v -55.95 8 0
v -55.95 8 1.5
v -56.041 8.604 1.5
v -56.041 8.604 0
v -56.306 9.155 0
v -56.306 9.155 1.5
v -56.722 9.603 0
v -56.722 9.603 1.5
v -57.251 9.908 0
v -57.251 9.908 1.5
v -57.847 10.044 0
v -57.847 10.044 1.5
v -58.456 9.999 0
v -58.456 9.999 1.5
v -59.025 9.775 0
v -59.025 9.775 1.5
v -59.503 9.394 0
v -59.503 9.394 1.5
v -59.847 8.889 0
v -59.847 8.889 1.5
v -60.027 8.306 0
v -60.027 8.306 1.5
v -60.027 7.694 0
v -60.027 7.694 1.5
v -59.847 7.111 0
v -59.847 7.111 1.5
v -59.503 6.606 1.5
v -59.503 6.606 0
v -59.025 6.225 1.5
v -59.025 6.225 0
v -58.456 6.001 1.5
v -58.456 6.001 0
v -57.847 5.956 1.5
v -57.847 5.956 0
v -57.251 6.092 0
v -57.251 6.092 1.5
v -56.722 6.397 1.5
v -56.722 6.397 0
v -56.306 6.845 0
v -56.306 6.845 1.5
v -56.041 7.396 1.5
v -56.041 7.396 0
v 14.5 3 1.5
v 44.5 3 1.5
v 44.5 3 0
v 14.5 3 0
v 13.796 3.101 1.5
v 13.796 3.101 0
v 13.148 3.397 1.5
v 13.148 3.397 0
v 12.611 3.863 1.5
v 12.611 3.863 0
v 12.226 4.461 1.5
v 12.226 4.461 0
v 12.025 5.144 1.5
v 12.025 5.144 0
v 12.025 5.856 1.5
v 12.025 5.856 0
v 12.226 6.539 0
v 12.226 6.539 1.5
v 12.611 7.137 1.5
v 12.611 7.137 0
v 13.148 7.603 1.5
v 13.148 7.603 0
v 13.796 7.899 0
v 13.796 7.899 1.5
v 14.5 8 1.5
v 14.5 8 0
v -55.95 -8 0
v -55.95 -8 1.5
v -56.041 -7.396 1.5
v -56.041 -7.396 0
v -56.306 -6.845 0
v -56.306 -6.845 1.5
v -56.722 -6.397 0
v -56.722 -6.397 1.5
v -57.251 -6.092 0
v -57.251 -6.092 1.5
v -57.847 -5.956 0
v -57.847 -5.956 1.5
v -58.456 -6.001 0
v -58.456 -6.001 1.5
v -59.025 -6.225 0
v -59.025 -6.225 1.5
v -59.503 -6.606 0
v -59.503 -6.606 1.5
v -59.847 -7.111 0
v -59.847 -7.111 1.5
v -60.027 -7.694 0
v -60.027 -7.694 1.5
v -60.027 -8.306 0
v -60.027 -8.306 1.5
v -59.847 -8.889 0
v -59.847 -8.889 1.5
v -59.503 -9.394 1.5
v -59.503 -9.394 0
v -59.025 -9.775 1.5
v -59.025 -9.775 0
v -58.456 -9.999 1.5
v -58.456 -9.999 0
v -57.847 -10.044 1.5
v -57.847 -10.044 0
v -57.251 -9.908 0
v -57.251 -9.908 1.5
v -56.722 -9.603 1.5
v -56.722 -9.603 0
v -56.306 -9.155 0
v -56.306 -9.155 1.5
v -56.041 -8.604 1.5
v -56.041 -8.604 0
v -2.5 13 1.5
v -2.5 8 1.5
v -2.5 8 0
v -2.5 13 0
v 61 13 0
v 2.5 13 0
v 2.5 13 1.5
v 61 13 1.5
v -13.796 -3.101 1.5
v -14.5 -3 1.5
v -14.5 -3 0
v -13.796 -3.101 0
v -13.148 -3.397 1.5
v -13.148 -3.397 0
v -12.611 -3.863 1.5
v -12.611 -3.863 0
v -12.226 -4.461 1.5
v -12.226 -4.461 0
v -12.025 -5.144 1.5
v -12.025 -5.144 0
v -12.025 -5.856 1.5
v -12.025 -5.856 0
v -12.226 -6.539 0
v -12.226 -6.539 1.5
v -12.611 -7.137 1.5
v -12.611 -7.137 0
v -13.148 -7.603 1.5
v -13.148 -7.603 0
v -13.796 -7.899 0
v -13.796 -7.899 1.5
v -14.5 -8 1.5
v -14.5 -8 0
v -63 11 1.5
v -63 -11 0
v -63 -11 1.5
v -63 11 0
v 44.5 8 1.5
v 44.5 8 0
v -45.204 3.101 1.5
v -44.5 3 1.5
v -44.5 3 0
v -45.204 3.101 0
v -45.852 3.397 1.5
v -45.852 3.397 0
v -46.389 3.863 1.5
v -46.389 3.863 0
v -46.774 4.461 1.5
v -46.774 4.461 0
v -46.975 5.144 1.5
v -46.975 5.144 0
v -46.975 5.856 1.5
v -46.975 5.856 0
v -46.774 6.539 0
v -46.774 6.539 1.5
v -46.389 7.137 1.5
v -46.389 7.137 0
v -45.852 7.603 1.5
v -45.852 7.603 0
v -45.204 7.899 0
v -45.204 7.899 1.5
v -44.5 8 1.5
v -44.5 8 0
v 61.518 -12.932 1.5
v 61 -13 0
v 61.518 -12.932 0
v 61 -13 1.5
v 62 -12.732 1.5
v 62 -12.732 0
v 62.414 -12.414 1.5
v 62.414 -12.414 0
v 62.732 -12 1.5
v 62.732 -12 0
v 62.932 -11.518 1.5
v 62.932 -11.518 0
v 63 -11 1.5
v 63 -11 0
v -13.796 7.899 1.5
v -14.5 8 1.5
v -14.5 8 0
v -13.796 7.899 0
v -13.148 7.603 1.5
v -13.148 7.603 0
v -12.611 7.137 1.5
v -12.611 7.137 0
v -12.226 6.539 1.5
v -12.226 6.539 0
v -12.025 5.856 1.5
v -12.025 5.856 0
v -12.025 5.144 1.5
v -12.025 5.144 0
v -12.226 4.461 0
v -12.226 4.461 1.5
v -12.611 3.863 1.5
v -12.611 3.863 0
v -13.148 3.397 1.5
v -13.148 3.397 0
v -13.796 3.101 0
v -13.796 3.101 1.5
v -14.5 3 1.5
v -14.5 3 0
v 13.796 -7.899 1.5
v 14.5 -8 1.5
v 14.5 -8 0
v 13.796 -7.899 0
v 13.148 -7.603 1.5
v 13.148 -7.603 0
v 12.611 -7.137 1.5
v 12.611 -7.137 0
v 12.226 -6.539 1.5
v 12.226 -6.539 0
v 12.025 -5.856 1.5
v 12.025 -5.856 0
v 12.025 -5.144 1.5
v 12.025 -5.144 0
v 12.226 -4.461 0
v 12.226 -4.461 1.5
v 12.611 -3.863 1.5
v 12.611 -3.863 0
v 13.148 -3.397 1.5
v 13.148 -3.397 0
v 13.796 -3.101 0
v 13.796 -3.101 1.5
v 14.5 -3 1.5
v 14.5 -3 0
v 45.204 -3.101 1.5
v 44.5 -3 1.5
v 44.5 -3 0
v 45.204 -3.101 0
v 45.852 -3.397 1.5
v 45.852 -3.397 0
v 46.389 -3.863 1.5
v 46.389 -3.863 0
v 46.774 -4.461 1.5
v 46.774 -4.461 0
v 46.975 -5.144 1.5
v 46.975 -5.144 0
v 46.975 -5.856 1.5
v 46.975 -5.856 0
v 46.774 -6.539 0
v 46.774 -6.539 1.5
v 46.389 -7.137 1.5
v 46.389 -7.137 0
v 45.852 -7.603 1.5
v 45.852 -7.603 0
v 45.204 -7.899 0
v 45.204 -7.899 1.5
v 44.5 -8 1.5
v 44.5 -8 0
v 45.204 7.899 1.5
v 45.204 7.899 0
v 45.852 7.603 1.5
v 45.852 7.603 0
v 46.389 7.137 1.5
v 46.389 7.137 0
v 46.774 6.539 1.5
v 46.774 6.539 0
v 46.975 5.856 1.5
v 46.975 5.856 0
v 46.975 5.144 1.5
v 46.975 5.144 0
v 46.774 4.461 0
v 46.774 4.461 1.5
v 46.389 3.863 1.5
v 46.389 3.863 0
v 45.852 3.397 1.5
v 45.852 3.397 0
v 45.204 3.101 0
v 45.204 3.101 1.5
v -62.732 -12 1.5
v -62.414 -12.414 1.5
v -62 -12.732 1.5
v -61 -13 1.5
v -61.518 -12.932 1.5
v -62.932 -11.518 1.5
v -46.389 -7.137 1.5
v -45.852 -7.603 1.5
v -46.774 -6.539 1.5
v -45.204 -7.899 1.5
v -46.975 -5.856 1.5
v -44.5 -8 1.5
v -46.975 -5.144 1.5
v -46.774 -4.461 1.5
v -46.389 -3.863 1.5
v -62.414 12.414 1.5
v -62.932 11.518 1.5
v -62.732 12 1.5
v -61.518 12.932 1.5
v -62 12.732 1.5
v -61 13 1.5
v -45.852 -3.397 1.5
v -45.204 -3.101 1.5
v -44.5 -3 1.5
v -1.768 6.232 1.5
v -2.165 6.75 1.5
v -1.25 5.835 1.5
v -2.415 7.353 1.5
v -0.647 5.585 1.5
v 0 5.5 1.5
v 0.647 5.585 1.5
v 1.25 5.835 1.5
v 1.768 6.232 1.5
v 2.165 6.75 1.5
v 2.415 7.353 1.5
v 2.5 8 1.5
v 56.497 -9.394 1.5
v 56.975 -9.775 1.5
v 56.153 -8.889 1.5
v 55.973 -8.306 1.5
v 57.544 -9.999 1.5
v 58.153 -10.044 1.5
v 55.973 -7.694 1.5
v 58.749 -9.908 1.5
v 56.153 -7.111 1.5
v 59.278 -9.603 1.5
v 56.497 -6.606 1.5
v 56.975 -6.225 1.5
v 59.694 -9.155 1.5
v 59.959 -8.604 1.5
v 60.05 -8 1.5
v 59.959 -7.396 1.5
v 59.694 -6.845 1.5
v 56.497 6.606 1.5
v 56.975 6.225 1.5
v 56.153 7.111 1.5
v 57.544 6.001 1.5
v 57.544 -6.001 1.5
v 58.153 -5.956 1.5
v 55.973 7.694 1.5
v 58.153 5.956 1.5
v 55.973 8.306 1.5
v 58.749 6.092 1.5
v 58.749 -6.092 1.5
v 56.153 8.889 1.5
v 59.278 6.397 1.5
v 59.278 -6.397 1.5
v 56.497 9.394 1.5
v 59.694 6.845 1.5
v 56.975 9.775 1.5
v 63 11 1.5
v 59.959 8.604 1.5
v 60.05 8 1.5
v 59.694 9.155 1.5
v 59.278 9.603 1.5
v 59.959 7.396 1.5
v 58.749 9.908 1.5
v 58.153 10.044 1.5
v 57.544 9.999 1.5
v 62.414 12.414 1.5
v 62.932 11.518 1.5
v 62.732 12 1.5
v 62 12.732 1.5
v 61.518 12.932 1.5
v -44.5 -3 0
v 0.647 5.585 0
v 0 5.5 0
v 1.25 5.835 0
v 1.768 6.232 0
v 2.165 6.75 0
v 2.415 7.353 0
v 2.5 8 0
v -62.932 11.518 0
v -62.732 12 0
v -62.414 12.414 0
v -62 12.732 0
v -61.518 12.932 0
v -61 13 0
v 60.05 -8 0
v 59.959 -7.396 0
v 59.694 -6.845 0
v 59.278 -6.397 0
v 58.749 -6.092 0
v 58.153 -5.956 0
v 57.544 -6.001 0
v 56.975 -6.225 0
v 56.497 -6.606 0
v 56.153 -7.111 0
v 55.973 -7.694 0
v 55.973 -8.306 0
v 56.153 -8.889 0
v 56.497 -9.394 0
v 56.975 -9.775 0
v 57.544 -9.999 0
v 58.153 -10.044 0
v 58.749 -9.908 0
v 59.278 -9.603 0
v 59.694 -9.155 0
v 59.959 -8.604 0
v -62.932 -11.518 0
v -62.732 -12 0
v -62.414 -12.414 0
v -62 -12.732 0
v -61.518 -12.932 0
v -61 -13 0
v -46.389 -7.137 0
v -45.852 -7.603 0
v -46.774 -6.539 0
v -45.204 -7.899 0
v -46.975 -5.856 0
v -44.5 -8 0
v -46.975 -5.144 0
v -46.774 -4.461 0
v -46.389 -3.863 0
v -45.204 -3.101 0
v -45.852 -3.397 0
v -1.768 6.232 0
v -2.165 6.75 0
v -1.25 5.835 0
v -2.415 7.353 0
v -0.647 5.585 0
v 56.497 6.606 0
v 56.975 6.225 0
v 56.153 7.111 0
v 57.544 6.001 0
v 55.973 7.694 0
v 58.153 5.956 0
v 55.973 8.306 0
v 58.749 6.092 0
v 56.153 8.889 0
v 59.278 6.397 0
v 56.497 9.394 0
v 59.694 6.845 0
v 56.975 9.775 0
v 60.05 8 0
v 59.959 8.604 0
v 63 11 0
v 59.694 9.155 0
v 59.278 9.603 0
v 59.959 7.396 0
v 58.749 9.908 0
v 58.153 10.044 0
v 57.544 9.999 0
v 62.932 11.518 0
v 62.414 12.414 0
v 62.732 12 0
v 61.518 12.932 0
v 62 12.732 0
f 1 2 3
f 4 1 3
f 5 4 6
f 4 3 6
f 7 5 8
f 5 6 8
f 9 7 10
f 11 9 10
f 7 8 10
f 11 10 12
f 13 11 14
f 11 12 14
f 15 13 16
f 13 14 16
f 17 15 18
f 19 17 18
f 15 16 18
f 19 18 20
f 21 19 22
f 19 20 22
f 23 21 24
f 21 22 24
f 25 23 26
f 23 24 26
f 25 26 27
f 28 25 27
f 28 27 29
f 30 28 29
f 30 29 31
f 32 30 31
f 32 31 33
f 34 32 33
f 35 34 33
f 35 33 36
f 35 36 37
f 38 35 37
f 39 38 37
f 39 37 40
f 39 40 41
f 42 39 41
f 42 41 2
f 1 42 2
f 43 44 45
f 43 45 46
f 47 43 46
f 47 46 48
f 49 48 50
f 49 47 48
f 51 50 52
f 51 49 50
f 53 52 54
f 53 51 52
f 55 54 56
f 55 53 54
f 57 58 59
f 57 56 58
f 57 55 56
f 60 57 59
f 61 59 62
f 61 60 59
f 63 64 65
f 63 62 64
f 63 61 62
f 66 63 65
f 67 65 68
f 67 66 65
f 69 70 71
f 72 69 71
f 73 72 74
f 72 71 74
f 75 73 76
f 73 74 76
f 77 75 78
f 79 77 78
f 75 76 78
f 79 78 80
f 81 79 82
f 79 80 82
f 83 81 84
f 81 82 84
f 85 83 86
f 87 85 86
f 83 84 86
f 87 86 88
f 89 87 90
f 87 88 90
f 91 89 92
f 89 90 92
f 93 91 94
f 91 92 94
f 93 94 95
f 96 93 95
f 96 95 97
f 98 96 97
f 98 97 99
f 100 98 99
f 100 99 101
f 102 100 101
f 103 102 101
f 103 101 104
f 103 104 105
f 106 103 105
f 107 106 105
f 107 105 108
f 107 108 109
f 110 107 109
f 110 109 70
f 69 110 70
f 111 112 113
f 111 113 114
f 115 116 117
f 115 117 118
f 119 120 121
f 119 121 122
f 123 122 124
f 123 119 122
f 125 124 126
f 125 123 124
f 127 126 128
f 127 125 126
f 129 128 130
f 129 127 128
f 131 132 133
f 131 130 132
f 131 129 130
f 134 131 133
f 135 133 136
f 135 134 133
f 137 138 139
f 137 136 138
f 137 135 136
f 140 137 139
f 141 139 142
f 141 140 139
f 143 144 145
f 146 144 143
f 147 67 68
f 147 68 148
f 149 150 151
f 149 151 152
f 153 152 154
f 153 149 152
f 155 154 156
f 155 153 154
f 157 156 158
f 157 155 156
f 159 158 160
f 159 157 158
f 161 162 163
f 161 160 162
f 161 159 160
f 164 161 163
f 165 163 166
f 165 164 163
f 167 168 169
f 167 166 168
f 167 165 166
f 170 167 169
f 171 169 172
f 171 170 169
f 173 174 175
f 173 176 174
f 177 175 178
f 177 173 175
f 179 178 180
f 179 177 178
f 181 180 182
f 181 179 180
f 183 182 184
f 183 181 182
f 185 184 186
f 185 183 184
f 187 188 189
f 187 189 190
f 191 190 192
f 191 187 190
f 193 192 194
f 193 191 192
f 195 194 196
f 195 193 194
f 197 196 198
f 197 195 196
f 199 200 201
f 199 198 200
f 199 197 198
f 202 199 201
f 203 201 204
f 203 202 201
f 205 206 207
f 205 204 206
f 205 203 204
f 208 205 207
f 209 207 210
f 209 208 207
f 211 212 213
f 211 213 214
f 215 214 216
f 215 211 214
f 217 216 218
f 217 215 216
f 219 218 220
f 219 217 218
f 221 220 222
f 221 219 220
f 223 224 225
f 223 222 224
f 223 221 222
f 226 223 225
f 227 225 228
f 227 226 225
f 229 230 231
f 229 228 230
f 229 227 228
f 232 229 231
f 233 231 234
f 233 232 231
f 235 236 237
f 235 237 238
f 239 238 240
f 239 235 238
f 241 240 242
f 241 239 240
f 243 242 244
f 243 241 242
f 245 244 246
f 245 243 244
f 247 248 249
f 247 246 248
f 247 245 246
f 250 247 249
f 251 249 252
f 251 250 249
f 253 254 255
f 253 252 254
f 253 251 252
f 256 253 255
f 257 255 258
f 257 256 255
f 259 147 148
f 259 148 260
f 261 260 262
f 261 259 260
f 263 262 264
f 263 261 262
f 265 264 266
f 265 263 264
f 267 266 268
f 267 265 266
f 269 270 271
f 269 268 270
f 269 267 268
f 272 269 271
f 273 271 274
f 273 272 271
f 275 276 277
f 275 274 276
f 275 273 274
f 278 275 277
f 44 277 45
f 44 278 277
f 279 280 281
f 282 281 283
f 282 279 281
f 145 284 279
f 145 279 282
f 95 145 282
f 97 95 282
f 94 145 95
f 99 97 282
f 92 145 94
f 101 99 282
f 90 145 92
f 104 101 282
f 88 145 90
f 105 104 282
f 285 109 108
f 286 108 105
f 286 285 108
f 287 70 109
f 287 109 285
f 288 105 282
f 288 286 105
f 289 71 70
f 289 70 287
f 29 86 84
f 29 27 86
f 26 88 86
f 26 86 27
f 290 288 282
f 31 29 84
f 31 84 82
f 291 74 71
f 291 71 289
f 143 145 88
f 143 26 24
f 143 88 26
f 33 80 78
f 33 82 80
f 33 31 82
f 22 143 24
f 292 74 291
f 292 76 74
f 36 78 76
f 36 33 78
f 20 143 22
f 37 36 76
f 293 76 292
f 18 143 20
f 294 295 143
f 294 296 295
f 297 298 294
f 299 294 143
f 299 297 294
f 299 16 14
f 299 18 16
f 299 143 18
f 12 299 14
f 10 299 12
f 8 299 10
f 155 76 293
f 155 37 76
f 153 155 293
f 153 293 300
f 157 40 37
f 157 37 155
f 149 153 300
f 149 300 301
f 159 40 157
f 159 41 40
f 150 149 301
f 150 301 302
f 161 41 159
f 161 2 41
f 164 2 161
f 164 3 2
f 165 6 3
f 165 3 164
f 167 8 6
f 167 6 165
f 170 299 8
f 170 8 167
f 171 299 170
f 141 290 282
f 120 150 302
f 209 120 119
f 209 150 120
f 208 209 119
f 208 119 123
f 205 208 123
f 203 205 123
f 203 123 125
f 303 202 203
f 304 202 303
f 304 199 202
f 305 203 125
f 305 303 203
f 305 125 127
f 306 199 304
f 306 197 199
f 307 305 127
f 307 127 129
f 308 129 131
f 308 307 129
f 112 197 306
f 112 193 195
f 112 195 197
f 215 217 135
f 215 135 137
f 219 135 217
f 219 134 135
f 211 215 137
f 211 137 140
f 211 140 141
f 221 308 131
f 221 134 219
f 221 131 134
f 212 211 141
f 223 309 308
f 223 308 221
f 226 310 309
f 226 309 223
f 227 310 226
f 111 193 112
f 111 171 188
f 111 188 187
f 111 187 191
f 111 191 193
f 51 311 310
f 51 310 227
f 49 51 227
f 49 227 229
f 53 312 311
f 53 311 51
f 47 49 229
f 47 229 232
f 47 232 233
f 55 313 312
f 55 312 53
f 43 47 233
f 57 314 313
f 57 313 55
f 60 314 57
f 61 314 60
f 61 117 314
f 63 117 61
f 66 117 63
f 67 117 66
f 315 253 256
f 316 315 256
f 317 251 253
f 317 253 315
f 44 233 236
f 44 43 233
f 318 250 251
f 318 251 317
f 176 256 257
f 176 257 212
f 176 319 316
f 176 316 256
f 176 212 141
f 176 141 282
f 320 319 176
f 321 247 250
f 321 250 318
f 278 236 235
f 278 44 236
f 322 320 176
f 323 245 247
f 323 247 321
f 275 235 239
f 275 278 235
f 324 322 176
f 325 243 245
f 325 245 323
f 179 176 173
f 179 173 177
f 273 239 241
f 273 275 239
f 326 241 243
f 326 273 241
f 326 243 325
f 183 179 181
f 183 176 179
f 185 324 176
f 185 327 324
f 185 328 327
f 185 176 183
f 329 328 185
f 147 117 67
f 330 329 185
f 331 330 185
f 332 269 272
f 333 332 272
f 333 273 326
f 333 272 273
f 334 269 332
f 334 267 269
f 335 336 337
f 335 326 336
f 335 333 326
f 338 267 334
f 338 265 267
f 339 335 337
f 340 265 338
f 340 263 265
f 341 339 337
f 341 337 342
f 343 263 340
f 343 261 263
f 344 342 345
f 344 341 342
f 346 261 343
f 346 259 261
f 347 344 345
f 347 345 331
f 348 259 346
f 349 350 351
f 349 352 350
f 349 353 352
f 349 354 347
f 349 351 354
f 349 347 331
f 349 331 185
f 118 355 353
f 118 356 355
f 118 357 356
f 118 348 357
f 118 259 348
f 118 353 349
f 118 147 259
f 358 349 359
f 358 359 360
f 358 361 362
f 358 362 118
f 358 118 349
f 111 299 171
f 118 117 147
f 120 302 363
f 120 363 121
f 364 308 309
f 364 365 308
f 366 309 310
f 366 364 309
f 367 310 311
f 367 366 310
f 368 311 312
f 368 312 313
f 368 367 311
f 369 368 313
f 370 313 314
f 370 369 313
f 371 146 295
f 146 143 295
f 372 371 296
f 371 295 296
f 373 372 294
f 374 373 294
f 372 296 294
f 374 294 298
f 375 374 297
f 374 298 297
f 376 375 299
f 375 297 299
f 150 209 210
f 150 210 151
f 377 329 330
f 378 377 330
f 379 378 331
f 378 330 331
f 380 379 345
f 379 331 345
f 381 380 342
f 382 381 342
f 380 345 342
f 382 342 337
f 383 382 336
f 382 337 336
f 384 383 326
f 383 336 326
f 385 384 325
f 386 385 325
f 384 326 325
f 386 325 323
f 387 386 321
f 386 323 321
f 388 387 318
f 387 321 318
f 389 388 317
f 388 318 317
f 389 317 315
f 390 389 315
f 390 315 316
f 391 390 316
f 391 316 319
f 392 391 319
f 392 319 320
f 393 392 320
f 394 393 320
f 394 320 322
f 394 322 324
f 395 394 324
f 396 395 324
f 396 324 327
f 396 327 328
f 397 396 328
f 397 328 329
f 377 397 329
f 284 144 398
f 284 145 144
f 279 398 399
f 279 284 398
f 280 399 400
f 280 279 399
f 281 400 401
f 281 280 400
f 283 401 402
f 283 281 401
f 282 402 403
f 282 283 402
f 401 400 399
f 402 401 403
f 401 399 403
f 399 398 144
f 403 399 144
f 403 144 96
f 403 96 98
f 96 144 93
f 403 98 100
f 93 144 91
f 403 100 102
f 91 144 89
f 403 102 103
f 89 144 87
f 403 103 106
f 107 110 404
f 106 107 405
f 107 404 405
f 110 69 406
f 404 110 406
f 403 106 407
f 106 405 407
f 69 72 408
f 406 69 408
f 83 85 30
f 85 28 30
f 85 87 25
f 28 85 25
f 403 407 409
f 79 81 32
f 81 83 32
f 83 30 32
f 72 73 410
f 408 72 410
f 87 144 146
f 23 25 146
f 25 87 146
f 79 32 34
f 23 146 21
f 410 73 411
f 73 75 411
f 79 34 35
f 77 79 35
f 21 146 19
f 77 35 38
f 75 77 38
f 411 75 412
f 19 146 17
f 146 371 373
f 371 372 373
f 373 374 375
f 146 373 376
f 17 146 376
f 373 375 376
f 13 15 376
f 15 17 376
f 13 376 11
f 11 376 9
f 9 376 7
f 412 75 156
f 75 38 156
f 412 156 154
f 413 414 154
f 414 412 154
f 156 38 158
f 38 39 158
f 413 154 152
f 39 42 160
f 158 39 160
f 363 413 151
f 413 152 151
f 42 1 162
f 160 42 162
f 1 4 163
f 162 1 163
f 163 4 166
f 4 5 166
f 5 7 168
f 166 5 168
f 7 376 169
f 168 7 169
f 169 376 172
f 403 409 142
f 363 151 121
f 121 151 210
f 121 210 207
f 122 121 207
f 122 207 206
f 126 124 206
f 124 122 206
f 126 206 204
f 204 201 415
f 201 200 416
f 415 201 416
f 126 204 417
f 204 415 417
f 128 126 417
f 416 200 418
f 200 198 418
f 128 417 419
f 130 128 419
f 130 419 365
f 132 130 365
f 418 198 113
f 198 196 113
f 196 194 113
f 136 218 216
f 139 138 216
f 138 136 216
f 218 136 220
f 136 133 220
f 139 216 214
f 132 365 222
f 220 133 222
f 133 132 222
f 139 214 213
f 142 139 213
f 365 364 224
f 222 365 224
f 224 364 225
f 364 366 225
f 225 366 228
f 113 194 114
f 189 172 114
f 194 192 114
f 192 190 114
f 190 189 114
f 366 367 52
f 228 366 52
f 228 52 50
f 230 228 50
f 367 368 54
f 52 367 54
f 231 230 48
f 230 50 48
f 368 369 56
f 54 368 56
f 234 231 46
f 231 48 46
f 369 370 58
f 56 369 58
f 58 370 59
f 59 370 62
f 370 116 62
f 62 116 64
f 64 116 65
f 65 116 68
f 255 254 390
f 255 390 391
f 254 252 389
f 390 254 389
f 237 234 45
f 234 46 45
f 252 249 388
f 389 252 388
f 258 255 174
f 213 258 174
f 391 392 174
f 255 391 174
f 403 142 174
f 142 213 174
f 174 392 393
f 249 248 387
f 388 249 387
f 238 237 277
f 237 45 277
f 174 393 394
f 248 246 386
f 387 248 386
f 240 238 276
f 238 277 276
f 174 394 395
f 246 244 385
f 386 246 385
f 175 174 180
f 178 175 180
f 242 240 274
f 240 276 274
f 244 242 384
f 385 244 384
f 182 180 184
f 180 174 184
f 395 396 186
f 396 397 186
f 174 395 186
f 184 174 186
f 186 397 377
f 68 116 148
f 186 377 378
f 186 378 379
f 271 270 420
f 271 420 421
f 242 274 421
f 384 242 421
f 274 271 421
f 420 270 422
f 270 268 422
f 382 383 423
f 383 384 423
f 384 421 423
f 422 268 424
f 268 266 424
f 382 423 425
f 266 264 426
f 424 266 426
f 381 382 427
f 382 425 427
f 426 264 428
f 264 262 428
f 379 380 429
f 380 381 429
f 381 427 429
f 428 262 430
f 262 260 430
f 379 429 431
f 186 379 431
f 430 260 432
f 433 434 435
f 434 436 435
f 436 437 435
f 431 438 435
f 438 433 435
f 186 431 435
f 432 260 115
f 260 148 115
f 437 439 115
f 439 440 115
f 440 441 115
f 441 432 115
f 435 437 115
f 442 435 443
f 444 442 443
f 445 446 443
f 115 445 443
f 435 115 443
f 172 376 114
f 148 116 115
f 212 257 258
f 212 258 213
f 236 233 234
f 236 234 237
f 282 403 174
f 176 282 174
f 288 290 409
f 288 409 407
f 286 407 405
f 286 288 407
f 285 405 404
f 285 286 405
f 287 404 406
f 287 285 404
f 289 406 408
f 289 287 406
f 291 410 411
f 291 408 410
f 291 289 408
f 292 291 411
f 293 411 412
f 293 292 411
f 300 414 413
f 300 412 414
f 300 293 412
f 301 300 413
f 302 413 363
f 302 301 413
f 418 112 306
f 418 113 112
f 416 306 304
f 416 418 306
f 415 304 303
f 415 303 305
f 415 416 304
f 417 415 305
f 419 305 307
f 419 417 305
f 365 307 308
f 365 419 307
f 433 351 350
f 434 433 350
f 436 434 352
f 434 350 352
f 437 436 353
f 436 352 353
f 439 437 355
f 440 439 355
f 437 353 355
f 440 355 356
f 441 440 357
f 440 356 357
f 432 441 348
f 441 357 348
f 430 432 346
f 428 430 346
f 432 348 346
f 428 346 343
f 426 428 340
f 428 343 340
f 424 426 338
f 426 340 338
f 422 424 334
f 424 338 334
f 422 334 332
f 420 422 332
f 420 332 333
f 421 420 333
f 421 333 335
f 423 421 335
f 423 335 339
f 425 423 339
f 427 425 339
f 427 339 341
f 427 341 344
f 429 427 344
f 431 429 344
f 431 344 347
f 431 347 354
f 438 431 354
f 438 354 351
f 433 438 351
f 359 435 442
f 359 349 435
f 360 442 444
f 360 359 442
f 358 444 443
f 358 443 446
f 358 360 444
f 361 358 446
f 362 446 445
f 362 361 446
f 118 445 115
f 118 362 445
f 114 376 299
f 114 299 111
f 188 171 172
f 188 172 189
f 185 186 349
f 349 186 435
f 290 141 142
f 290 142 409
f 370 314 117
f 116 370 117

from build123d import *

# Parameters (mm, degrees)
SKETCH_1_W          = 126
SKETCH_1_H          = 26
EXTRUDE_1_DEPTH     = 1.5
FILLET_1_R          = 2
SKETCH_2_W          = 5
SKETCH_2_H          = 15
CUT_EXTRUDE_1_DEPTH = 65.344774458
FILLET_2_R          = 2.5
CUT_EXTRUDE_2_DEPTH = 65.344774458
SKETCH_4_R          = 2.05
CUT_EXTRUDE_3_DEPTH = 65.344774458


with BuildPart() as part:
    # 草图1 → 凸台-拉伸1 (new body)
    with BuildSketch(Plane.XY):
        Rectangle(SKETCH_1_W, SKETCH_1_H)
    extrude(amount=EXTRUDE_1_DEPTH)

    # 圆角1
    fillet_1_edges = [part.edges().sort_by_distance(p)[0] for p in [
        (-63, 13, 0.75),
        (63, 13, 0.75),
        (63, -13, 0.75),
        (-63, -13, 0.75),
    ]]
    fillet(fillet_1_edges, radius=FILLET_1_R)

    # 草图2 → 切除-拉伸1 (cut, through all)
    with BuildSketch(Plane.XY.offset(1.5)):
        with Locations((0, 13)):
            Rectangle(SKETCH_2_W, SKETCH_2_H)
    extrude(amount=-CUT_EXTRUDE_1_DEPTH, mode=Mode.SUBTRACT)

    # 圆角2
    fillet_2_edges = [part.edges().sort_by_distance(p)[0] for p in [
        (2.5, 5.5, 0.75),
        (-2.5, 5.5, 0.75),
    ]]
    fillet(fillet_2_edges, radius=FILLET_2_R - 0.0001)  # a hair under: the kernel refuses the full size

    # 草图3 → 切除-拉伸2 (cut, through all)
    with BuildSketch(Plane.XY.offset(1.5)):
        with BuildLine():
            Line((-44.5, 8), (-14.5, 8))
            ThreePointArc((-14.5, 8), (-12, 5.5), (-14.5, 3))
            Line((-14.5, 3), (-44.5, 3))
            ThreePointArc((-44.5, 3), (-47, 5.5), (-44.5, 8))
        make_face()
        with BuildLine():
            Line((14.5, 8), (44.5, 8))
            ThreePointArc((44.5, 8), (47, 5.5), (44.5, 3))
            Line((44.5, 3), (14.5, 3))
            ThreePointArc((14.5, 3), (12, 5.5), (14.5, 8))
        make_face()
        with BuildLine():
            Line((14.5, -3), (44.5, -3))
            ThreePointArc((44.5, -3), (47, -5.5), (44.5, -8))
            Line((44.5, -8), (14.5, -8))
            ThreePointArc((14.5, -8), (12, -5.5), (14.5, -3))
        make_face()
        with BuildLine():
            Line((-44.5, -3), (-14.5, -3))
            ThreePointArc((-14.5, -3), (-12, -5.5), (-14.5, -8))
            Line((-14.5, -8), (-44.5, -8))
            ThreePointArc((-44.5, -8), (-47, -5.5), (-44.5, -3))
        make_face()
    extrude(amount=-CUT_EXTRUDE_2_DEPTH, mode=Mode.SUBTRACT)

    # 草图4 → 切除-拉伸3 (cut, through all)
    with BuildSketch(Plane.XY.offset(1.5)):
        with Locations((58, -8)):
            Circle(SKETCH_4_R)
        with Locations((58, 8)):
            Circle(SKETCH_4_R)
        with Locations((-58, 8)):
            Circle(SKETCH_4_R)
        with Locations((-58, -8)):
            Circle(SKETCH_4_R)
    extrude(amount=-CUT_EXTRUDE_3_DEPTH, mode=Mode.SUBTRACT)


solid = part.part
